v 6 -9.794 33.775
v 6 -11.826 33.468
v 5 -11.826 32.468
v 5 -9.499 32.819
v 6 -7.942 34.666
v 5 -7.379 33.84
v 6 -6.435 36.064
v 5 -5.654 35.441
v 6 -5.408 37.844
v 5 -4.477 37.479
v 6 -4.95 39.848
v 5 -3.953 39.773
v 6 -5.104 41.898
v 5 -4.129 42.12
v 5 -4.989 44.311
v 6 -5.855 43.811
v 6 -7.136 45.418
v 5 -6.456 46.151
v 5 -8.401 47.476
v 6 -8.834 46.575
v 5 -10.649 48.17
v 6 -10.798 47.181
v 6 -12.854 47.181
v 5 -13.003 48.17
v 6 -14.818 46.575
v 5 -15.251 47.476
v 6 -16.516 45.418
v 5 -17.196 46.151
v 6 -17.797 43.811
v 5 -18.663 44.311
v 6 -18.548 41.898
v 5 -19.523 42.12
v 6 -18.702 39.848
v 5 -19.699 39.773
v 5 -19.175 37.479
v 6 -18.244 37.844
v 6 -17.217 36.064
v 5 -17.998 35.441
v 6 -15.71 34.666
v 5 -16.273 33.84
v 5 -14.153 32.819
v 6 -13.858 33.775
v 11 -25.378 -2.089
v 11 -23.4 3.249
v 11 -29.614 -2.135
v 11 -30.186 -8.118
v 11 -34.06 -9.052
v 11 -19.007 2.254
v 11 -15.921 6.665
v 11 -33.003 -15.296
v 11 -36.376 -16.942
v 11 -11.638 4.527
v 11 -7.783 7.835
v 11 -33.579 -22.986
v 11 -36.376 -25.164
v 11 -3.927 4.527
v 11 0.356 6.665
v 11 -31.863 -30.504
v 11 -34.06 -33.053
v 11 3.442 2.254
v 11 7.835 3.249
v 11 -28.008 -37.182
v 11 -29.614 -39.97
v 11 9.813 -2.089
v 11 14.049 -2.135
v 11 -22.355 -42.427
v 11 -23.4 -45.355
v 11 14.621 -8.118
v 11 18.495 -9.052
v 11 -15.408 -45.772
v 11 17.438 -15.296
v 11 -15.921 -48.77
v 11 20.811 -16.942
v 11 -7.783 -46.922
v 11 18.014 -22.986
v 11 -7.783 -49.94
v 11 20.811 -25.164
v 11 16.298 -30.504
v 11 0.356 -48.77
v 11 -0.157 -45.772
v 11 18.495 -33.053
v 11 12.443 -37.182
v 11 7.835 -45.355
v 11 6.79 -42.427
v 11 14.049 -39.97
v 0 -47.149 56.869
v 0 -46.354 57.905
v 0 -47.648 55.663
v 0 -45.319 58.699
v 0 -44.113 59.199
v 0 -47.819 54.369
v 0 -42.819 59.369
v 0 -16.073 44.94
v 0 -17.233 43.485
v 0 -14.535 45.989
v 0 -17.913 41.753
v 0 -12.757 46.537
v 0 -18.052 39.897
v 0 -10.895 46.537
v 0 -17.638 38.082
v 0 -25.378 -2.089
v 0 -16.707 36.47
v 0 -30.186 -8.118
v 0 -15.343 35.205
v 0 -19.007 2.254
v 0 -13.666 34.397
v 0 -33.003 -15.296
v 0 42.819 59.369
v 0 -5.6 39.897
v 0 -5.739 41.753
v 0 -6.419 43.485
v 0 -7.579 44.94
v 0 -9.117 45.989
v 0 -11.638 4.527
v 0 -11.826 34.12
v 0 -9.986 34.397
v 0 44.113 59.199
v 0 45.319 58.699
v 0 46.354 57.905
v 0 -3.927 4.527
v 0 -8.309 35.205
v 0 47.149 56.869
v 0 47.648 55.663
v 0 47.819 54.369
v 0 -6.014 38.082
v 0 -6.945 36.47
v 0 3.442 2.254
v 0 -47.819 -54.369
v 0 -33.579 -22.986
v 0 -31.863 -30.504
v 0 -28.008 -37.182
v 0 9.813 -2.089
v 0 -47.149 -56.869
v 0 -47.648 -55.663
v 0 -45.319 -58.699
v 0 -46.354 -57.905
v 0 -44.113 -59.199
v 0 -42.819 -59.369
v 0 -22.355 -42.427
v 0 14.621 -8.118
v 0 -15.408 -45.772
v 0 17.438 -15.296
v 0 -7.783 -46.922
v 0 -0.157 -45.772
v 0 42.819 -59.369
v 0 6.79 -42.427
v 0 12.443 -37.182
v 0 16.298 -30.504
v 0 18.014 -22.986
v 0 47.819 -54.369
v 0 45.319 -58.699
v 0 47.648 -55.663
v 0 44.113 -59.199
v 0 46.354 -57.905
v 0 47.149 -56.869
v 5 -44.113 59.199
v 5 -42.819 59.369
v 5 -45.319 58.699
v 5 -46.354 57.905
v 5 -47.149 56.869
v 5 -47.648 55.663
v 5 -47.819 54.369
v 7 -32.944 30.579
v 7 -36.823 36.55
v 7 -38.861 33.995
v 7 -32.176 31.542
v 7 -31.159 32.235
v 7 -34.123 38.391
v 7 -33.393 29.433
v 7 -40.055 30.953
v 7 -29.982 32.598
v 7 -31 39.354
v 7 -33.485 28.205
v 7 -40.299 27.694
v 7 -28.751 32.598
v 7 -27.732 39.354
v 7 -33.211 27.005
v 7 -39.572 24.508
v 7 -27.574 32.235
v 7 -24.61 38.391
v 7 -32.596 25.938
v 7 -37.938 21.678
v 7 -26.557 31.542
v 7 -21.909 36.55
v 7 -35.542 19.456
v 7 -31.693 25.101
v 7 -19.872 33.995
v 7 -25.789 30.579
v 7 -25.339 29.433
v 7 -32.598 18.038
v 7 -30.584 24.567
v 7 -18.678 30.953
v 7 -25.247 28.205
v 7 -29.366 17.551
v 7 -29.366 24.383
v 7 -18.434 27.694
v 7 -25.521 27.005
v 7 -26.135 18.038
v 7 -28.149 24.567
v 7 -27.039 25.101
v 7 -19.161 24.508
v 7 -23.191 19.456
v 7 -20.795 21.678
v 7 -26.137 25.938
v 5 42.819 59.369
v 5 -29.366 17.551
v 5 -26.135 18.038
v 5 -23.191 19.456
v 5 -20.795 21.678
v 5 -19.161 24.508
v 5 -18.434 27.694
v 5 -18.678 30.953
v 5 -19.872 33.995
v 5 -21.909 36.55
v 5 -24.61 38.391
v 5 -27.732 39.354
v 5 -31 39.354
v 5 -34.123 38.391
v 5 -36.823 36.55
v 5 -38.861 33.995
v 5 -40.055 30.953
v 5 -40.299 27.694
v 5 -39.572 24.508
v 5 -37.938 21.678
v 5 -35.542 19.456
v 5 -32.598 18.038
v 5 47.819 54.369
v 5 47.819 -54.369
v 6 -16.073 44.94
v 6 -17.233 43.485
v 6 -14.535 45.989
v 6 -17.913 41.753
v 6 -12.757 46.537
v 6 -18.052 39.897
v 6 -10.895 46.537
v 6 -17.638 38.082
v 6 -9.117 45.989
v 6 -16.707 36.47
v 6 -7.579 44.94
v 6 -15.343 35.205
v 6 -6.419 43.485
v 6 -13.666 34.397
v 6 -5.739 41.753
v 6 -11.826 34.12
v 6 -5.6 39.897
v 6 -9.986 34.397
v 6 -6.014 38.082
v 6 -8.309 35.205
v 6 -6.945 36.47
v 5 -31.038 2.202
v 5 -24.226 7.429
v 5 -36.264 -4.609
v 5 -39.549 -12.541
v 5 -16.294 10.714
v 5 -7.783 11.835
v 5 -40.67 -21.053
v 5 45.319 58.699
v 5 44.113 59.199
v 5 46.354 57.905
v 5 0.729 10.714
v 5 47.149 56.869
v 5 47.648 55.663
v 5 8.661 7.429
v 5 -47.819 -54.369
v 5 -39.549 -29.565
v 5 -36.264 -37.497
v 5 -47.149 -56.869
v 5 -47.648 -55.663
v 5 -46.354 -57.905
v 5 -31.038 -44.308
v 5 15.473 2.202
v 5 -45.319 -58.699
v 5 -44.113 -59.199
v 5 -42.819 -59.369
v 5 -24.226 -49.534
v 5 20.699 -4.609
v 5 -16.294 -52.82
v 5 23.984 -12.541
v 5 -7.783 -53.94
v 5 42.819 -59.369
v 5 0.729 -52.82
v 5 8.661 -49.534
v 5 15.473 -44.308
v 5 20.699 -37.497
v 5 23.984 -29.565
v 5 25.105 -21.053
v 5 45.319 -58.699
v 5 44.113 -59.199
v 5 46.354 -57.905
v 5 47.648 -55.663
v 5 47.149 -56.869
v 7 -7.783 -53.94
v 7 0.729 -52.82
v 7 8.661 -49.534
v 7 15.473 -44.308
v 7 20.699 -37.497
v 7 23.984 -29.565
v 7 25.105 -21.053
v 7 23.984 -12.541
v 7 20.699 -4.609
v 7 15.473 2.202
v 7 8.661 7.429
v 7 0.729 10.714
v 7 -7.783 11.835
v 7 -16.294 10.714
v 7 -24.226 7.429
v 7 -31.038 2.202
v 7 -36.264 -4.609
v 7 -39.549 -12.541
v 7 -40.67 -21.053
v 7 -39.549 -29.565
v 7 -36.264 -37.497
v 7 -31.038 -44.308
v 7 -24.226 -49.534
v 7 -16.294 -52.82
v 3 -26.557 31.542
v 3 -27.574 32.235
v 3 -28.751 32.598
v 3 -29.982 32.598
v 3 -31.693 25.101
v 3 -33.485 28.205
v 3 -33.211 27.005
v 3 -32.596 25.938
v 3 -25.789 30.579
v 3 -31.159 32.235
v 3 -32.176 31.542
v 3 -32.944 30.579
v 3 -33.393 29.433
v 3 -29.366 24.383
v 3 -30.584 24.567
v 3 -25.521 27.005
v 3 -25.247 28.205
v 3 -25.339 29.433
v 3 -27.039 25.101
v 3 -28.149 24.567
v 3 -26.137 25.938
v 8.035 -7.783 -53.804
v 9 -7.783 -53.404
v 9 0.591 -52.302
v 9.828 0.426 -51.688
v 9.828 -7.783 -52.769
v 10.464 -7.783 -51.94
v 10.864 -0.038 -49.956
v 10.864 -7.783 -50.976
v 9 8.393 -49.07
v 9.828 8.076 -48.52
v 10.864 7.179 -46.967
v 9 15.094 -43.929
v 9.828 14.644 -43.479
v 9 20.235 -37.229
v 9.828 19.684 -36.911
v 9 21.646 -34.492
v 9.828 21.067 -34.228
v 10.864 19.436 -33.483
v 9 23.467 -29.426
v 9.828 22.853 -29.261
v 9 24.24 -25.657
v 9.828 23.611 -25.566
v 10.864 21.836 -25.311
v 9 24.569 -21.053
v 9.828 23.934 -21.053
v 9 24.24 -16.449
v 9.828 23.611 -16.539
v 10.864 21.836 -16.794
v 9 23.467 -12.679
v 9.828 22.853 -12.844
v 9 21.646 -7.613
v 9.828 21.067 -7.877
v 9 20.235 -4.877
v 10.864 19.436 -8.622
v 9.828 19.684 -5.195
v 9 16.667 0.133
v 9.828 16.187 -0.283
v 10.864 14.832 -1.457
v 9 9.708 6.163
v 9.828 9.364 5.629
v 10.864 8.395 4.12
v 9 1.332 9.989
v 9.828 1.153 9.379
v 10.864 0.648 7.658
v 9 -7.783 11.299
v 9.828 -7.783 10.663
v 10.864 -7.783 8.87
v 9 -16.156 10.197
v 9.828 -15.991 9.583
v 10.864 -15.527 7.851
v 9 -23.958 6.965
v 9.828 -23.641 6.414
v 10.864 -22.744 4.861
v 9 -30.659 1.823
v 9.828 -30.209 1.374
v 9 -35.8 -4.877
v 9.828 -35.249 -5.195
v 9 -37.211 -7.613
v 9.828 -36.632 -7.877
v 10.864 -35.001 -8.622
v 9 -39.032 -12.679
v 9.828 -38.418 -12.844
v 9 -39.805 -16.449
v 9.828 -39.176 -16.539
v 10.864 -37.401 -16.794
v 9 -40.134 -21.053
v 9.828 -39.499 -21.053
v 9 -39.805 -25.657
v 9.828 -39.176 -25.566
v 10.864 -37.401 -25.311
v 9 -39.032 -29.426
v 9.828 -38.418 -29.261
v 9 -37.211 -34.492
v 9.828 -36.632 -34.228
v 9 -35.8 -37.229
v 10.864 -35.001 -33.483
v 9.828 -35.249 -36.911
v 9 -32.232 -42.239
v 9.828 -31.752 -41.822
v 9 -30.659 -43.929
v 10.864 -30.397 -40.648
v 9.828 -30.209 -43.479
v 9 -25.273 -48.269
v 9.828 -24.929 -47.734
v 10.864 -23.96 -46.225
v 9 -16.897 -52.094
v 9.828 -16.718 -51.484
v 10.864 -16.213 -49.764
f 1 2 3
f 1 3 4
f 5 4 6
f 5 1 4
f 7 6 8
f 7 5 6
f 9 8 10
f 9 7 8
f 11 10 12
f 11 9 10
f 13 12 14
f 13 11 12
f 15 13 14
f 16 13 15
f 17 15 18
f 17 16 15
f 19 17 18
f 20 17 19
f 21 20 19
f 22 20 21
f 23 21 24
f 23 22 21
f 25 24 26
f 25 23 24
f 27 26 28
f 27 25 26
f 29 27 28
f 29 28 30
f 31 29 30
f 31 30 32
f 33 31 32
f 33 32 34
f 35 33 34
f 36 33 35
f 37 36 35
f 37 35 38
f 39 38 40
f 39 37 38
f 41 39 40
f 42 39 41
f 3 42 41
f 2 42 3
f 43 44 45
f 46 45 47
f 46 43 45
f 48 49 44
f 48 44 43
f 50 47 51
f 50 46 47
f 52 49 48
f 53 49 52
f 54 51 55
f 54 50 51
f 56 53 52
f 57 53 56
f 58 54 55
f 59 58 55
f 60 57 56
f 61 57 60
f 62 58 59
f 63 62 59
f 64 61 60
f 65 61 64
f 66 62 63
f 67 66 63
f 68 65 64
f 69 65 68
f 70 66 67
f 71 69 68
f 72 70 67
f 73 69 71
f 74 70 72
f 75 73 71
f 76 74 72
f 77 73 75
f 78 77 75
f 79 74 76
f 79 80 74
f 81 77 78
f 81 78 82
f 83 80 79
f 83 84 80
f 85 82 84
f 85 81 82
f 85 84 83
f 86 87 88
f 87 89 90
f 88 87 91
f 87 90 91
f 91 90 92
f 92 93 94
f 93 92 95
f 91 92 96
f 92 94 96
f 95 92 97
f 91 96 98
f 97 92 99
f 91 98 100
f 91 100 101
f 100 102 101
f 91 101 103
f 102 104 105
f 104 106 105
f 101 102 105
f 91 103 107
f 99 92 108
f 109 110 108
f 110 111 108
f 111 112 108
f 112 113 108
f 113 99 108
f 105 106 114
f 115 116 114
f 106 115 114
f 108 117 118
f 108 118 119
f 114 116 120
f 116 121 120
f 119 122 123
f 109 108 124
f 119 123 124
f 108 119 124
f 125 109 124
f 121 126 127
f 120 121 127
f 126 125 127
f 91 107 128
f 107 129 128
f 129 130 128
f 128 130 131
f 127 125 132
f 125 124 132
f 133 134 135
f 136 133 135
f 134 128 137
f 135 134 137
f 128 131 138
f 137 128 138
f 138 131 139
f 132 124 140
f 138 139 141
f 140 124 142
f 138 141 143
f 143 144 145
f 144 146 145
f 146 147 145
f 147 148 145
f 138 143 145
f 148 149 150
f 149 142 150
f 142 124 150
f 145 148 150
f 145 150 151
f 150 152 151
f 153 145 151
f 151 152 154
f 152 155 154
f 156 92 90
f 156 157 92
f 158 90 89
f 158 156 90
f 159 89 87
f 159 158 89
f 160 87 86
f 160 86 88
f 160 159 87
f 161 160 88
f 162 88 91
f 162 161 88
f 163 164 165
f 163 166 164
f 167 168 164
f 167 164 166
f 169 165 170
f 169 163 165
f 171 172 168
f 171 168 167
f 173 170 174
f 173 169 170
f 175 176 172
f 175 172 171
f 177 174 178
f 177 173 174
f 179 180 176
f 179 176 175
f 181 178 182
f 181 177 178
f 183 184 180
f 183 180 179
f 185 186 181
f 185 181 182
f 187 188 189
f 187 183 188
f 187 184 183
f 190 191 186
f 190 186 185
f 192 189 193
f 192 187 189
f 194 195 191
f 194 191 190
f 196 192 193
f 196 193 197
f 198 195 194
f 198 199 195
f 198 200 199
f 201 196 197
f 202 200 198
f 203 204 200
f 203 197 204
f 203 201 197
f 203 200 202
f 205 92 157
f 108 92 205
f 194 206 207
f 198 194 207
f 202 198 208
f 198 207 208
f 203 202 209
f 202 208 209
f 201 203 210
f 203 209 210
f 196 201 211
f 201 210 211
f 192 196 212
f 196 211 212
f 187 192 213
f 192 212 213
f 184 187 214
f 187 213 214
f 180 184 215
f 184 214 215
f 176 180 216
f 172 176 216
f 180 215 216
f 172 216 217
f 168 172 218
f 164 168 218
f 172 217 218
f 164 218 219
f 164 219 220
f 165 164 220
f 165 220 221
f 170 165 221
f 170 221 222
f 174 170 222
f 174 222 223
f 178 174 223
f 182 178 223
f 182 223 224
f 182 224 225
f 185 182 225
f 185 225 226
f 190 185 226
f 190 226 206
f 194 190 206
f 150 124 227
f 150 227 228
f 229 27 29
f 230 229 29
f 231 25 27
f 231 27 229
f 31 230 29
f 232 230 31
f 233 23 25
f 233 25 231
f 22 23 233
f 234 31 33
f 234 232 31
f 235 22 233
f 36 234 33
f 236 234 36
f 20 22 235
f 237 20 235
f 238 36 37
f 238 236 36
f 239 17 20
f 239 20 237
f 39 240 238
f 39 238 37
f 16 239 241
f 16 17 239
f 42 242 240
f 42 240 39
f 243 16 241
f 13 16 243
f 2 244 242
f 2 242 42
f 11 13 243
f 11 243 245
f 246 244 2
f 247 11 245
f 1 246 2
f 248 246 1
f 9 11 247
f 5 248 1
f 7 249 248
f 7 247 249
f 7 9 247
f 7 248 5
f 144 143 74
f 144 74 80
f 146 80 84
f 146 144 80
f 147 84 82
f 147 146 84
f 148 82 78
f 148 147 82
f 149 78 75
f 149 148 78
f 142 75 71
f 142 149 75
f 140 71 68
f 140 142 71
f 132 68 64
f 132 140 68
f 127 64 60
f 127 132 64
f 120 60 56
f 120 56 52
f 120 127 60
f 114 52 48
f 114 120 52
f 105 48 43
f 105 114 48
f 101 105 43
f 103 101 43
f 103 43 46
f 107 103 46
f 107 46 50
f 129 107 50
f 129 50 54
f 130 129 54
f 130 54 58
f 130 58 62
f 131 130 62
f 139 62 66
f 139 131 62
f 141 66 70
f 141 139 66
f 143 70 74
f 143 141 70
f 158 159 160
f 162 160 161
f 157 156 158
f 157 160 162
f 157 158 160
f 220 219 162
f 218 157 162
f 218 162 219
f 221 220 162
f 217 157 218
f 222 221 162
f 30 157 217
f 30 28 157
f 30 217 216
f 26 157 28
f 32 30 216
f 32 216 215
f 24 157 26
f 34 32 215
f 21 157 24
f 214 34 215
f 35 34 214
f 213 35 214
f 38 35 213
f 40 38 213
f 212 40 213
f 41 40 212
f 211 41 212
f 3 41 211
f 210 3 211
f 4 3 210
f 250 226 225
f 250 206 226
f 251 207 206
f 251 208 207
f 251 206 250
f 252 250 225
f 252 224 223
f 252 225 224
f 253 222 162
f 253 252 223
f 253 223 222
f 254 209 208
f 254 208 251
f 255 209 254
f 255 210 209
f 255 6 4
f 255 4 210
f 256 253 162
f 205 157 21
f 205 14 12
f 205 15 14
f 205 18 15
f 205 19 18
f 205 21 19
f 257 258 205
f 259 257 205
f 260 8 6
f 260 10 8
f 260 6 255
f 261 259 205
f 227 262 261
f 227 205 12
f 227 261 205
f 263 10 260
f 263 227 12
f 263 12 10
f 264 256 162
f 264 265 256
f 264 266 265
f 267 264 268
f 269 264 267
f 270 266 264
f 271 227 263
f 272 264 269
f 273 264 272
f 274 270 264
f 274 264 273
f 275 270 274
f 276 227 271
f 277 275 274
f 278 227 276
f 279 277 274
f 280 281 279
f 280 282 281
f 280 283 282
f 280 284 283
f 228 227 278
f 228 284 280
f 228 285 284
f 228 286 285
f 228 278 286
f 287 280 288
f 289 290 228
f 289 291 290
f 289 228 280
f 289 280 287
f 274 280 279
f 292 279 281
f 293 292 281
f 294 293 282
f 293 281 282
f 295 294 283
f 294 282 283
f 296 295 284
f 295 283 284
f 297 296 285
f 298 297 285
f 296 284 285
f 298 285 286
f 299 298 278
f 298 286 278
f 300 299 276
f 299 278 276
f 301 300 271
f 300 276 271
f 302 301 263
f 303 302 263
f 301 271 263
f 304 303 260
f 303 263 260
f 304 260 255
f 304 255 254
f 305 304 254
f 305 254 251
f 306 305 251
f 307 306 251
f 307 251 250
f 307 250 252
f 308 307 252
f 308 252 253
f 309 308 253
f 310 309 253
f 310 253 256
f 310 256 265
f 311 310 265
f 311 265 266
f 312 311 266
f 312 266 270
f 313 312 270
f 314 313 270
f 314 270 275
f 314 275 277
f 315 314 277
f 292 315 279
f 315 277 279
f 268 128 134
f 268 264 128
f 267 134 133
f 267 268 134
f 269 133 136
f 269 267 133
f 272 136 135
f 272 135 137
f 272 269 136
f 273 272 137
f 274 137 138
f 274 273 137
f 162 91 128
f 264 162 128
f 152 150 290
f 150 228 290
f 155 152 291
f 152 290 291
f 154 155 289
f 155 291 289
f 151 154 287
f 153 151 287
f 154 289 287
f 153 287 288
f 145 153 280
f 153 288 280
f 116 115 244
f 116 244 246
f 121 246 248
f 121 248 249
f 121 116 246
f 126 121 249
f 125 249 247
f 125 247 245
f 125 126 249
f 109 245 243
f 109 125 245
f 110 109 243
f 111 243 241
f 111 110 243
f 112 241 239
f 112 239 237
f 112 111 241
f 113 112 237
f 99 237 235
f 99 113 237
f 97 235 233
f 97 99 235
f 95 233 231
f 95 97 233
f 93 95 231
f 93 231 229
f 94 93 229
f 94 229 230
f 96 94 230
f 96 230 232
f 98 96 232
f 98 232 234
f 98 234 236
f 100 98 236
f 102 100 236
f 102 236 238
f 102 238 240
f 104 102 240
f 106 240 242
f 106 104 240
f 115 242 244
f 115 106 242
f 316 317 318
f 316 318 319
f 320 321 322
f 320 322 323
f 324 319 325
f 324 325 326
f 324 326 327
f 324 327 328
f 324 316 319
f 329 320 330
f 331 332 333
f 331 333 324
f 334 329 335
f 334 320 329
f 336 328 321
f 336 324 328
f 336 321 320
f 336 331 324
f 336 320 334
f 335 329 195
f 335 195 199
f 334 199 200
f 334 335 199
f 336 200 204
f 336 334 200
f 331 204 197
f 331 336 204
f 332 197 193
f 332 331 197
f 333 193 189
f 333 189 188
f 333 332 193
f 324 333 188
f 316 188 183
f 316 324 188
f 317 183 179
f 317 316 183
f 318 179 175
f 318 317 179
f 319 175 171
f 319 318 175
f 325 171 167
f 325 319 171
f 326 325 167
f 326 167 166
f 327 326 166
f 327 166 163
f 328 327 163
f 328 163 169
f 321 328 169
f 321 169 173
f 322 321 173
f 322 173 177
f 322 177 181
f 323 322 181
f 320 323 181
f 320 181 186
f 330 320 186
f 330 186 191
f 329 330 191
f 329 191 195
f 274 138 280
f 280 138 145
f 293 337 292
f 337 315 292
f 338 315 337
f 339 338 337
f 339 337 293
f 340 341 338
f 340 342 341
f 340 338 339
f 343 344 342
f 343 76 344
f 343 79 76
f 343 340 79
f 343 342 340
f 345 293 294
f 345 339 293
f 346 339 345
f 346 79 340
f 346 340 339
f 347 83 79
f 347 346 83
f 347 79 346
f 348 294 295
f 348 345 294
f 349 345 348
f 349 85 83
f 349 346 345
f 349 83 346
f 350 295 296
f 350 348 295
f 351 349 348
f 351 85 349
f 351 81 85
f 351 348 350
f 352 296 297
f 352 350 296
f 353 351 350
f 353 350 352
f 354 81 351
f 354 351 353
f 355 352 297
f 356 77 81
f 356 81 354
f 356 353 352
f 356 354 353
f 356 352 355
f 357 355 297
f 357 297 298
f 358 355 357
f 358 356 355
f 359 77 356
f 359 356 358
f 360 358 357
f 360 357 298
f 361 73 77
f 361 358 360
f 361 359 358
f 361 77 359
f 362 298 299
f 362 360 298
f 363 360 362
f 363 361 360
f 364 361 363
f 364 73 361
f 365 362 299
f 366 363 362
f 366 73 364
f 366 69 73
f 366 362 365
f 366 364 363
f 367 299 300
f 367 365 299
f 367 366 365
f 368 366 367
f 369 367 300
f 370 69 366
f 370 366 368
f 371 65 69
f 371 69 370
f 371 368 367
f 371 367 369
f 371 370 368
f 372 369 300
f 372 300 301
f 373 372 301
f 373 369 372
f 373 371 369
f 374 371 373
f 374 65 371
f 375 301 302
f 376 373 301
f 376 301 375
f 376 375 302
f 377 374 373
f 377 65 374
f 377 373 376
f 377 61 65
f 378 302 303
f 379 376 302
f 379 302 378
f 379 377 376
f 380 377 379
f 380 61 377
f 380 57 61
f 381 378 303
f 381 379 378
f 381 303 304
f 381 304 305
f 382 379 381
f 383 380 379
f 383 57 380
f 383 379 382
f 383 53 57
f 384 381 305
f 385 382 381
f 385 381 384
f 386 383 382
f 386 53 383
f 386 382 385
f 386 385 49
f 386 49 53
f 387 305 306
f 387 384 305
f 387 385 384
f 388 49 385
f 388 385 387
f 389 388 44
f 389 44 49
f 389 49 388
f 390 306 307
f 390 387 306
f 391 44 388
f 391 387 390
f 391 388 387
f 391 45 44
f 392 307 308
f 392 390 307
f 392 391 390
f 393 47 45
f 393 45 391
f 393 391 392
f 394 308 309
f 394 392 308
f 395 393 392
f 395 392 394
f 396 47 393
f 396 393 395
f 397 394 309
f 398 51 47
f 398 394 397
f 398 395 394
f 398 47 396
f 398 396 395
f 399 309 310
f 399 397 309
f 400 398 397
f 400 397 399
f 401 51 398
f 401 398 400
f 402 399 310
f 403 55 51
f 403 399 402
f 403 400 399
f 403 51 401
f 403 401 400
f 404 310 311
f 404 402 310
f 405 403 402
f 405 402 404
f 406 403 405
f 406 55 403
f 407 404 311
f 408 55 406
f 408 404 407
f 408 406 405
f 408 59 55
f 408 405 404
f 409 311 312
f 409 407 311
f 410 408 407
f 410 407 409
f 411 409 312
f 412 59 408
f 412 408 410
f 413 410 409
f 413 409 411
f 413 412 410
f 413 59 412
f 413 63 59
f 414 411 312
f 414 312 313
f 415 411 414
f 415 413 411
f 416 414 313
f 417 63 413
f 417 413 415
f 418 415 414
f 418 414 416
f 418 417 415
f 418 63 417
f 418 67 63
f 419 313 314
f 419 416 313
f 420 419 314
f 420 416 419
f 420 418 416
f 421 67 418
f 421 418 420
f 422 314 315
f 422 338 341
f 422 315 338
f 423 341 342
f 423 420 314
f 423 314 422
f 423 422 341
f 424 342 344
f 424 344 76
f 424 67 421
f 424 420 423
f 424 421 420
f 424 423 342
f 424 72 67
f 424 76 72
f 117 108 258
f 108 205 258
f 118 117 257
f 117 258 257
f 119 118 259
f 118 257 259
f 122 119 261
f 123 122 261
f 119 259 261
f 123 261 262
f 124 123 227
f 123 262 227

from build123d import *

# Parameters (mm, degrees)
SKETCH1_W           = 118.7383283
SKETCH1_H           = 95.637293174
SKETCH1_R           = 7.894829417
SKETCH1_R_2         = 10.963118073
SKETCH1_R_3         = 32.887608347
BOSS_EXTRUDE1_DEPTH = 5
SKETCH1_3_R         = 32.887608347
SKETCH1_3_R_2       = 25.869040911
BOSS_EXTRUDE2_DEPTH = 11
FILLET1_R           = 4
SKETCH1_4_R         = 10.963118073
SKETCH1_4_R_2       = 4.130606261
BOSS_EXTRUDE3_DEPTH = 7
SKETCH1_5_R         = 7.894829417
SKETCH1_5_R_2       = 6.243605875
BOSS_EXTRUDE4_DEPTH = 6
CHAMFER1_SIZE       = 1
FILLET2_R           = 5
SKETCH1_6_R         = 4.130606261
BOSS_EXTRUDE5_DEPTH = 3


with BuildPart() as part:
    # Sketch1 → Boss-Extrude1 (new body)
    with BuildSketch(Plane(origin=(0, 0, 0), x_dir=(0, 0, -1), z_dir=(1, 0, 0))):
        Rectangle(SKETCH1_W, SKETCH1_H)
        with Locations((-40.363308429, -11.826050305)):
            Circle(SKETCH1_R, mode=Mode.SUBTRACT)
        with Locations((-28.513672981, -29.366301206)):
            Circle(SKETCH1_R_2, mode=Mode.SUBTRACT)
        with Locations((21.052704773, -7.782501182)):
            Circle(SKETCH1_R_3, mode=Mode.SUBTRACT)
    extrude(amount=BOSS_EXTRUDE1_DEPTH)

    # Sketch1<3> → Boss-Extrude2 (add)
    with BuildSketch(Plane(origin=(0, 0, 0), x_dir=(0, 0, -1), z_dir=(1, 0, 0))):
        with Locations((21.052704773, -7.782501182)):
            Circle(SKETCH1_3_R)
        with Locations((21.052704773, -7.782501182)):
            Circle(SKETCH1_3_R_2, mode=Mode.SUBTRACT)
    extrude(amount=BOSS_EXTRUDE2_DEPTH)

    # Fillet1
    fillet1_edges = [part.edges().sort_by_distance(p)[0] for p in [
        (11, -7.782501182, 11.834903573),
    ]]
    fillet(fillet1_edges, radius=FILLET1_R)

    # Sketch1<4> → Boss-Extrude3 (add)
    with BuildSketch(Plane(origin=(0, 0, 0), x_dir=(0, 0, -1), z_dir=(1, 0, 0))):
        with Locations((-28.513672981, -29.366301206)):
            Circle(SKETCH1_4_R)
        with Locations((-28.513672981, -29.366301206)):
            Circle(SKETCH1_4_R_2, mode=Mode.SUBTRACT)
    extrude(amount=BOSS_EXTRUDE3_DEPTH)

    # Sketch1<5> → Boss-Extrude4 (add)
    with BuildSketch(Plane(origin=(0, 0, 0), x_dir=(0, 0, -1), z_dir=(1, 0, 0))):
        with Locations((-40.363308429, -11.826050305)):
            Circle(SKETCH1_5_R)
        with Locations((-40.363308429, -11.826050305)):
            Circle(SKETCH1_5_R_2, mode=Mode.SUBTRACT)
    extrude(amount=BOSS_EXTRUDE4_DEPTH)

    # Chamfer1
    chamfer1_edges = [part.edges().sort_by_distance(p)[0] for p in [
        (6, -11.826050305, 48.258137847),
    ]]
    chamfer(chamfer1_edges, length=CHAMFER1_SIZE - 0.0001)  # a hair under: the kernel refuses the full size

    # Fillet2
    fillet2_edges = [part.edges().sort_by_distance(p)[0] for p in [
        (2.5, -47.818646587, 59.36916415),
        (2.5, 47.818646587, 59.36916415),
        (2.5, 47.818646587, -59.36916415),
        (2.5, -47.818646587, -59.36916415),
    ]]
    fillet(fillet2_edges, radius=FILLET2_R)

    # Sketch1<6> → Boss-Extrude5 (add)
    with BuildSketch(Plane(origin=(0, 0, 0), x_dir=(0, 0, -1), z_dir=(1, 0, 0))):
        with Locations((-28.513672981, -29.366301206)):
            Circle(SKETCH1_6_R)
    extrude(amount=BOSS_EXTRUDE5_DEPTH)


solid = part.part
